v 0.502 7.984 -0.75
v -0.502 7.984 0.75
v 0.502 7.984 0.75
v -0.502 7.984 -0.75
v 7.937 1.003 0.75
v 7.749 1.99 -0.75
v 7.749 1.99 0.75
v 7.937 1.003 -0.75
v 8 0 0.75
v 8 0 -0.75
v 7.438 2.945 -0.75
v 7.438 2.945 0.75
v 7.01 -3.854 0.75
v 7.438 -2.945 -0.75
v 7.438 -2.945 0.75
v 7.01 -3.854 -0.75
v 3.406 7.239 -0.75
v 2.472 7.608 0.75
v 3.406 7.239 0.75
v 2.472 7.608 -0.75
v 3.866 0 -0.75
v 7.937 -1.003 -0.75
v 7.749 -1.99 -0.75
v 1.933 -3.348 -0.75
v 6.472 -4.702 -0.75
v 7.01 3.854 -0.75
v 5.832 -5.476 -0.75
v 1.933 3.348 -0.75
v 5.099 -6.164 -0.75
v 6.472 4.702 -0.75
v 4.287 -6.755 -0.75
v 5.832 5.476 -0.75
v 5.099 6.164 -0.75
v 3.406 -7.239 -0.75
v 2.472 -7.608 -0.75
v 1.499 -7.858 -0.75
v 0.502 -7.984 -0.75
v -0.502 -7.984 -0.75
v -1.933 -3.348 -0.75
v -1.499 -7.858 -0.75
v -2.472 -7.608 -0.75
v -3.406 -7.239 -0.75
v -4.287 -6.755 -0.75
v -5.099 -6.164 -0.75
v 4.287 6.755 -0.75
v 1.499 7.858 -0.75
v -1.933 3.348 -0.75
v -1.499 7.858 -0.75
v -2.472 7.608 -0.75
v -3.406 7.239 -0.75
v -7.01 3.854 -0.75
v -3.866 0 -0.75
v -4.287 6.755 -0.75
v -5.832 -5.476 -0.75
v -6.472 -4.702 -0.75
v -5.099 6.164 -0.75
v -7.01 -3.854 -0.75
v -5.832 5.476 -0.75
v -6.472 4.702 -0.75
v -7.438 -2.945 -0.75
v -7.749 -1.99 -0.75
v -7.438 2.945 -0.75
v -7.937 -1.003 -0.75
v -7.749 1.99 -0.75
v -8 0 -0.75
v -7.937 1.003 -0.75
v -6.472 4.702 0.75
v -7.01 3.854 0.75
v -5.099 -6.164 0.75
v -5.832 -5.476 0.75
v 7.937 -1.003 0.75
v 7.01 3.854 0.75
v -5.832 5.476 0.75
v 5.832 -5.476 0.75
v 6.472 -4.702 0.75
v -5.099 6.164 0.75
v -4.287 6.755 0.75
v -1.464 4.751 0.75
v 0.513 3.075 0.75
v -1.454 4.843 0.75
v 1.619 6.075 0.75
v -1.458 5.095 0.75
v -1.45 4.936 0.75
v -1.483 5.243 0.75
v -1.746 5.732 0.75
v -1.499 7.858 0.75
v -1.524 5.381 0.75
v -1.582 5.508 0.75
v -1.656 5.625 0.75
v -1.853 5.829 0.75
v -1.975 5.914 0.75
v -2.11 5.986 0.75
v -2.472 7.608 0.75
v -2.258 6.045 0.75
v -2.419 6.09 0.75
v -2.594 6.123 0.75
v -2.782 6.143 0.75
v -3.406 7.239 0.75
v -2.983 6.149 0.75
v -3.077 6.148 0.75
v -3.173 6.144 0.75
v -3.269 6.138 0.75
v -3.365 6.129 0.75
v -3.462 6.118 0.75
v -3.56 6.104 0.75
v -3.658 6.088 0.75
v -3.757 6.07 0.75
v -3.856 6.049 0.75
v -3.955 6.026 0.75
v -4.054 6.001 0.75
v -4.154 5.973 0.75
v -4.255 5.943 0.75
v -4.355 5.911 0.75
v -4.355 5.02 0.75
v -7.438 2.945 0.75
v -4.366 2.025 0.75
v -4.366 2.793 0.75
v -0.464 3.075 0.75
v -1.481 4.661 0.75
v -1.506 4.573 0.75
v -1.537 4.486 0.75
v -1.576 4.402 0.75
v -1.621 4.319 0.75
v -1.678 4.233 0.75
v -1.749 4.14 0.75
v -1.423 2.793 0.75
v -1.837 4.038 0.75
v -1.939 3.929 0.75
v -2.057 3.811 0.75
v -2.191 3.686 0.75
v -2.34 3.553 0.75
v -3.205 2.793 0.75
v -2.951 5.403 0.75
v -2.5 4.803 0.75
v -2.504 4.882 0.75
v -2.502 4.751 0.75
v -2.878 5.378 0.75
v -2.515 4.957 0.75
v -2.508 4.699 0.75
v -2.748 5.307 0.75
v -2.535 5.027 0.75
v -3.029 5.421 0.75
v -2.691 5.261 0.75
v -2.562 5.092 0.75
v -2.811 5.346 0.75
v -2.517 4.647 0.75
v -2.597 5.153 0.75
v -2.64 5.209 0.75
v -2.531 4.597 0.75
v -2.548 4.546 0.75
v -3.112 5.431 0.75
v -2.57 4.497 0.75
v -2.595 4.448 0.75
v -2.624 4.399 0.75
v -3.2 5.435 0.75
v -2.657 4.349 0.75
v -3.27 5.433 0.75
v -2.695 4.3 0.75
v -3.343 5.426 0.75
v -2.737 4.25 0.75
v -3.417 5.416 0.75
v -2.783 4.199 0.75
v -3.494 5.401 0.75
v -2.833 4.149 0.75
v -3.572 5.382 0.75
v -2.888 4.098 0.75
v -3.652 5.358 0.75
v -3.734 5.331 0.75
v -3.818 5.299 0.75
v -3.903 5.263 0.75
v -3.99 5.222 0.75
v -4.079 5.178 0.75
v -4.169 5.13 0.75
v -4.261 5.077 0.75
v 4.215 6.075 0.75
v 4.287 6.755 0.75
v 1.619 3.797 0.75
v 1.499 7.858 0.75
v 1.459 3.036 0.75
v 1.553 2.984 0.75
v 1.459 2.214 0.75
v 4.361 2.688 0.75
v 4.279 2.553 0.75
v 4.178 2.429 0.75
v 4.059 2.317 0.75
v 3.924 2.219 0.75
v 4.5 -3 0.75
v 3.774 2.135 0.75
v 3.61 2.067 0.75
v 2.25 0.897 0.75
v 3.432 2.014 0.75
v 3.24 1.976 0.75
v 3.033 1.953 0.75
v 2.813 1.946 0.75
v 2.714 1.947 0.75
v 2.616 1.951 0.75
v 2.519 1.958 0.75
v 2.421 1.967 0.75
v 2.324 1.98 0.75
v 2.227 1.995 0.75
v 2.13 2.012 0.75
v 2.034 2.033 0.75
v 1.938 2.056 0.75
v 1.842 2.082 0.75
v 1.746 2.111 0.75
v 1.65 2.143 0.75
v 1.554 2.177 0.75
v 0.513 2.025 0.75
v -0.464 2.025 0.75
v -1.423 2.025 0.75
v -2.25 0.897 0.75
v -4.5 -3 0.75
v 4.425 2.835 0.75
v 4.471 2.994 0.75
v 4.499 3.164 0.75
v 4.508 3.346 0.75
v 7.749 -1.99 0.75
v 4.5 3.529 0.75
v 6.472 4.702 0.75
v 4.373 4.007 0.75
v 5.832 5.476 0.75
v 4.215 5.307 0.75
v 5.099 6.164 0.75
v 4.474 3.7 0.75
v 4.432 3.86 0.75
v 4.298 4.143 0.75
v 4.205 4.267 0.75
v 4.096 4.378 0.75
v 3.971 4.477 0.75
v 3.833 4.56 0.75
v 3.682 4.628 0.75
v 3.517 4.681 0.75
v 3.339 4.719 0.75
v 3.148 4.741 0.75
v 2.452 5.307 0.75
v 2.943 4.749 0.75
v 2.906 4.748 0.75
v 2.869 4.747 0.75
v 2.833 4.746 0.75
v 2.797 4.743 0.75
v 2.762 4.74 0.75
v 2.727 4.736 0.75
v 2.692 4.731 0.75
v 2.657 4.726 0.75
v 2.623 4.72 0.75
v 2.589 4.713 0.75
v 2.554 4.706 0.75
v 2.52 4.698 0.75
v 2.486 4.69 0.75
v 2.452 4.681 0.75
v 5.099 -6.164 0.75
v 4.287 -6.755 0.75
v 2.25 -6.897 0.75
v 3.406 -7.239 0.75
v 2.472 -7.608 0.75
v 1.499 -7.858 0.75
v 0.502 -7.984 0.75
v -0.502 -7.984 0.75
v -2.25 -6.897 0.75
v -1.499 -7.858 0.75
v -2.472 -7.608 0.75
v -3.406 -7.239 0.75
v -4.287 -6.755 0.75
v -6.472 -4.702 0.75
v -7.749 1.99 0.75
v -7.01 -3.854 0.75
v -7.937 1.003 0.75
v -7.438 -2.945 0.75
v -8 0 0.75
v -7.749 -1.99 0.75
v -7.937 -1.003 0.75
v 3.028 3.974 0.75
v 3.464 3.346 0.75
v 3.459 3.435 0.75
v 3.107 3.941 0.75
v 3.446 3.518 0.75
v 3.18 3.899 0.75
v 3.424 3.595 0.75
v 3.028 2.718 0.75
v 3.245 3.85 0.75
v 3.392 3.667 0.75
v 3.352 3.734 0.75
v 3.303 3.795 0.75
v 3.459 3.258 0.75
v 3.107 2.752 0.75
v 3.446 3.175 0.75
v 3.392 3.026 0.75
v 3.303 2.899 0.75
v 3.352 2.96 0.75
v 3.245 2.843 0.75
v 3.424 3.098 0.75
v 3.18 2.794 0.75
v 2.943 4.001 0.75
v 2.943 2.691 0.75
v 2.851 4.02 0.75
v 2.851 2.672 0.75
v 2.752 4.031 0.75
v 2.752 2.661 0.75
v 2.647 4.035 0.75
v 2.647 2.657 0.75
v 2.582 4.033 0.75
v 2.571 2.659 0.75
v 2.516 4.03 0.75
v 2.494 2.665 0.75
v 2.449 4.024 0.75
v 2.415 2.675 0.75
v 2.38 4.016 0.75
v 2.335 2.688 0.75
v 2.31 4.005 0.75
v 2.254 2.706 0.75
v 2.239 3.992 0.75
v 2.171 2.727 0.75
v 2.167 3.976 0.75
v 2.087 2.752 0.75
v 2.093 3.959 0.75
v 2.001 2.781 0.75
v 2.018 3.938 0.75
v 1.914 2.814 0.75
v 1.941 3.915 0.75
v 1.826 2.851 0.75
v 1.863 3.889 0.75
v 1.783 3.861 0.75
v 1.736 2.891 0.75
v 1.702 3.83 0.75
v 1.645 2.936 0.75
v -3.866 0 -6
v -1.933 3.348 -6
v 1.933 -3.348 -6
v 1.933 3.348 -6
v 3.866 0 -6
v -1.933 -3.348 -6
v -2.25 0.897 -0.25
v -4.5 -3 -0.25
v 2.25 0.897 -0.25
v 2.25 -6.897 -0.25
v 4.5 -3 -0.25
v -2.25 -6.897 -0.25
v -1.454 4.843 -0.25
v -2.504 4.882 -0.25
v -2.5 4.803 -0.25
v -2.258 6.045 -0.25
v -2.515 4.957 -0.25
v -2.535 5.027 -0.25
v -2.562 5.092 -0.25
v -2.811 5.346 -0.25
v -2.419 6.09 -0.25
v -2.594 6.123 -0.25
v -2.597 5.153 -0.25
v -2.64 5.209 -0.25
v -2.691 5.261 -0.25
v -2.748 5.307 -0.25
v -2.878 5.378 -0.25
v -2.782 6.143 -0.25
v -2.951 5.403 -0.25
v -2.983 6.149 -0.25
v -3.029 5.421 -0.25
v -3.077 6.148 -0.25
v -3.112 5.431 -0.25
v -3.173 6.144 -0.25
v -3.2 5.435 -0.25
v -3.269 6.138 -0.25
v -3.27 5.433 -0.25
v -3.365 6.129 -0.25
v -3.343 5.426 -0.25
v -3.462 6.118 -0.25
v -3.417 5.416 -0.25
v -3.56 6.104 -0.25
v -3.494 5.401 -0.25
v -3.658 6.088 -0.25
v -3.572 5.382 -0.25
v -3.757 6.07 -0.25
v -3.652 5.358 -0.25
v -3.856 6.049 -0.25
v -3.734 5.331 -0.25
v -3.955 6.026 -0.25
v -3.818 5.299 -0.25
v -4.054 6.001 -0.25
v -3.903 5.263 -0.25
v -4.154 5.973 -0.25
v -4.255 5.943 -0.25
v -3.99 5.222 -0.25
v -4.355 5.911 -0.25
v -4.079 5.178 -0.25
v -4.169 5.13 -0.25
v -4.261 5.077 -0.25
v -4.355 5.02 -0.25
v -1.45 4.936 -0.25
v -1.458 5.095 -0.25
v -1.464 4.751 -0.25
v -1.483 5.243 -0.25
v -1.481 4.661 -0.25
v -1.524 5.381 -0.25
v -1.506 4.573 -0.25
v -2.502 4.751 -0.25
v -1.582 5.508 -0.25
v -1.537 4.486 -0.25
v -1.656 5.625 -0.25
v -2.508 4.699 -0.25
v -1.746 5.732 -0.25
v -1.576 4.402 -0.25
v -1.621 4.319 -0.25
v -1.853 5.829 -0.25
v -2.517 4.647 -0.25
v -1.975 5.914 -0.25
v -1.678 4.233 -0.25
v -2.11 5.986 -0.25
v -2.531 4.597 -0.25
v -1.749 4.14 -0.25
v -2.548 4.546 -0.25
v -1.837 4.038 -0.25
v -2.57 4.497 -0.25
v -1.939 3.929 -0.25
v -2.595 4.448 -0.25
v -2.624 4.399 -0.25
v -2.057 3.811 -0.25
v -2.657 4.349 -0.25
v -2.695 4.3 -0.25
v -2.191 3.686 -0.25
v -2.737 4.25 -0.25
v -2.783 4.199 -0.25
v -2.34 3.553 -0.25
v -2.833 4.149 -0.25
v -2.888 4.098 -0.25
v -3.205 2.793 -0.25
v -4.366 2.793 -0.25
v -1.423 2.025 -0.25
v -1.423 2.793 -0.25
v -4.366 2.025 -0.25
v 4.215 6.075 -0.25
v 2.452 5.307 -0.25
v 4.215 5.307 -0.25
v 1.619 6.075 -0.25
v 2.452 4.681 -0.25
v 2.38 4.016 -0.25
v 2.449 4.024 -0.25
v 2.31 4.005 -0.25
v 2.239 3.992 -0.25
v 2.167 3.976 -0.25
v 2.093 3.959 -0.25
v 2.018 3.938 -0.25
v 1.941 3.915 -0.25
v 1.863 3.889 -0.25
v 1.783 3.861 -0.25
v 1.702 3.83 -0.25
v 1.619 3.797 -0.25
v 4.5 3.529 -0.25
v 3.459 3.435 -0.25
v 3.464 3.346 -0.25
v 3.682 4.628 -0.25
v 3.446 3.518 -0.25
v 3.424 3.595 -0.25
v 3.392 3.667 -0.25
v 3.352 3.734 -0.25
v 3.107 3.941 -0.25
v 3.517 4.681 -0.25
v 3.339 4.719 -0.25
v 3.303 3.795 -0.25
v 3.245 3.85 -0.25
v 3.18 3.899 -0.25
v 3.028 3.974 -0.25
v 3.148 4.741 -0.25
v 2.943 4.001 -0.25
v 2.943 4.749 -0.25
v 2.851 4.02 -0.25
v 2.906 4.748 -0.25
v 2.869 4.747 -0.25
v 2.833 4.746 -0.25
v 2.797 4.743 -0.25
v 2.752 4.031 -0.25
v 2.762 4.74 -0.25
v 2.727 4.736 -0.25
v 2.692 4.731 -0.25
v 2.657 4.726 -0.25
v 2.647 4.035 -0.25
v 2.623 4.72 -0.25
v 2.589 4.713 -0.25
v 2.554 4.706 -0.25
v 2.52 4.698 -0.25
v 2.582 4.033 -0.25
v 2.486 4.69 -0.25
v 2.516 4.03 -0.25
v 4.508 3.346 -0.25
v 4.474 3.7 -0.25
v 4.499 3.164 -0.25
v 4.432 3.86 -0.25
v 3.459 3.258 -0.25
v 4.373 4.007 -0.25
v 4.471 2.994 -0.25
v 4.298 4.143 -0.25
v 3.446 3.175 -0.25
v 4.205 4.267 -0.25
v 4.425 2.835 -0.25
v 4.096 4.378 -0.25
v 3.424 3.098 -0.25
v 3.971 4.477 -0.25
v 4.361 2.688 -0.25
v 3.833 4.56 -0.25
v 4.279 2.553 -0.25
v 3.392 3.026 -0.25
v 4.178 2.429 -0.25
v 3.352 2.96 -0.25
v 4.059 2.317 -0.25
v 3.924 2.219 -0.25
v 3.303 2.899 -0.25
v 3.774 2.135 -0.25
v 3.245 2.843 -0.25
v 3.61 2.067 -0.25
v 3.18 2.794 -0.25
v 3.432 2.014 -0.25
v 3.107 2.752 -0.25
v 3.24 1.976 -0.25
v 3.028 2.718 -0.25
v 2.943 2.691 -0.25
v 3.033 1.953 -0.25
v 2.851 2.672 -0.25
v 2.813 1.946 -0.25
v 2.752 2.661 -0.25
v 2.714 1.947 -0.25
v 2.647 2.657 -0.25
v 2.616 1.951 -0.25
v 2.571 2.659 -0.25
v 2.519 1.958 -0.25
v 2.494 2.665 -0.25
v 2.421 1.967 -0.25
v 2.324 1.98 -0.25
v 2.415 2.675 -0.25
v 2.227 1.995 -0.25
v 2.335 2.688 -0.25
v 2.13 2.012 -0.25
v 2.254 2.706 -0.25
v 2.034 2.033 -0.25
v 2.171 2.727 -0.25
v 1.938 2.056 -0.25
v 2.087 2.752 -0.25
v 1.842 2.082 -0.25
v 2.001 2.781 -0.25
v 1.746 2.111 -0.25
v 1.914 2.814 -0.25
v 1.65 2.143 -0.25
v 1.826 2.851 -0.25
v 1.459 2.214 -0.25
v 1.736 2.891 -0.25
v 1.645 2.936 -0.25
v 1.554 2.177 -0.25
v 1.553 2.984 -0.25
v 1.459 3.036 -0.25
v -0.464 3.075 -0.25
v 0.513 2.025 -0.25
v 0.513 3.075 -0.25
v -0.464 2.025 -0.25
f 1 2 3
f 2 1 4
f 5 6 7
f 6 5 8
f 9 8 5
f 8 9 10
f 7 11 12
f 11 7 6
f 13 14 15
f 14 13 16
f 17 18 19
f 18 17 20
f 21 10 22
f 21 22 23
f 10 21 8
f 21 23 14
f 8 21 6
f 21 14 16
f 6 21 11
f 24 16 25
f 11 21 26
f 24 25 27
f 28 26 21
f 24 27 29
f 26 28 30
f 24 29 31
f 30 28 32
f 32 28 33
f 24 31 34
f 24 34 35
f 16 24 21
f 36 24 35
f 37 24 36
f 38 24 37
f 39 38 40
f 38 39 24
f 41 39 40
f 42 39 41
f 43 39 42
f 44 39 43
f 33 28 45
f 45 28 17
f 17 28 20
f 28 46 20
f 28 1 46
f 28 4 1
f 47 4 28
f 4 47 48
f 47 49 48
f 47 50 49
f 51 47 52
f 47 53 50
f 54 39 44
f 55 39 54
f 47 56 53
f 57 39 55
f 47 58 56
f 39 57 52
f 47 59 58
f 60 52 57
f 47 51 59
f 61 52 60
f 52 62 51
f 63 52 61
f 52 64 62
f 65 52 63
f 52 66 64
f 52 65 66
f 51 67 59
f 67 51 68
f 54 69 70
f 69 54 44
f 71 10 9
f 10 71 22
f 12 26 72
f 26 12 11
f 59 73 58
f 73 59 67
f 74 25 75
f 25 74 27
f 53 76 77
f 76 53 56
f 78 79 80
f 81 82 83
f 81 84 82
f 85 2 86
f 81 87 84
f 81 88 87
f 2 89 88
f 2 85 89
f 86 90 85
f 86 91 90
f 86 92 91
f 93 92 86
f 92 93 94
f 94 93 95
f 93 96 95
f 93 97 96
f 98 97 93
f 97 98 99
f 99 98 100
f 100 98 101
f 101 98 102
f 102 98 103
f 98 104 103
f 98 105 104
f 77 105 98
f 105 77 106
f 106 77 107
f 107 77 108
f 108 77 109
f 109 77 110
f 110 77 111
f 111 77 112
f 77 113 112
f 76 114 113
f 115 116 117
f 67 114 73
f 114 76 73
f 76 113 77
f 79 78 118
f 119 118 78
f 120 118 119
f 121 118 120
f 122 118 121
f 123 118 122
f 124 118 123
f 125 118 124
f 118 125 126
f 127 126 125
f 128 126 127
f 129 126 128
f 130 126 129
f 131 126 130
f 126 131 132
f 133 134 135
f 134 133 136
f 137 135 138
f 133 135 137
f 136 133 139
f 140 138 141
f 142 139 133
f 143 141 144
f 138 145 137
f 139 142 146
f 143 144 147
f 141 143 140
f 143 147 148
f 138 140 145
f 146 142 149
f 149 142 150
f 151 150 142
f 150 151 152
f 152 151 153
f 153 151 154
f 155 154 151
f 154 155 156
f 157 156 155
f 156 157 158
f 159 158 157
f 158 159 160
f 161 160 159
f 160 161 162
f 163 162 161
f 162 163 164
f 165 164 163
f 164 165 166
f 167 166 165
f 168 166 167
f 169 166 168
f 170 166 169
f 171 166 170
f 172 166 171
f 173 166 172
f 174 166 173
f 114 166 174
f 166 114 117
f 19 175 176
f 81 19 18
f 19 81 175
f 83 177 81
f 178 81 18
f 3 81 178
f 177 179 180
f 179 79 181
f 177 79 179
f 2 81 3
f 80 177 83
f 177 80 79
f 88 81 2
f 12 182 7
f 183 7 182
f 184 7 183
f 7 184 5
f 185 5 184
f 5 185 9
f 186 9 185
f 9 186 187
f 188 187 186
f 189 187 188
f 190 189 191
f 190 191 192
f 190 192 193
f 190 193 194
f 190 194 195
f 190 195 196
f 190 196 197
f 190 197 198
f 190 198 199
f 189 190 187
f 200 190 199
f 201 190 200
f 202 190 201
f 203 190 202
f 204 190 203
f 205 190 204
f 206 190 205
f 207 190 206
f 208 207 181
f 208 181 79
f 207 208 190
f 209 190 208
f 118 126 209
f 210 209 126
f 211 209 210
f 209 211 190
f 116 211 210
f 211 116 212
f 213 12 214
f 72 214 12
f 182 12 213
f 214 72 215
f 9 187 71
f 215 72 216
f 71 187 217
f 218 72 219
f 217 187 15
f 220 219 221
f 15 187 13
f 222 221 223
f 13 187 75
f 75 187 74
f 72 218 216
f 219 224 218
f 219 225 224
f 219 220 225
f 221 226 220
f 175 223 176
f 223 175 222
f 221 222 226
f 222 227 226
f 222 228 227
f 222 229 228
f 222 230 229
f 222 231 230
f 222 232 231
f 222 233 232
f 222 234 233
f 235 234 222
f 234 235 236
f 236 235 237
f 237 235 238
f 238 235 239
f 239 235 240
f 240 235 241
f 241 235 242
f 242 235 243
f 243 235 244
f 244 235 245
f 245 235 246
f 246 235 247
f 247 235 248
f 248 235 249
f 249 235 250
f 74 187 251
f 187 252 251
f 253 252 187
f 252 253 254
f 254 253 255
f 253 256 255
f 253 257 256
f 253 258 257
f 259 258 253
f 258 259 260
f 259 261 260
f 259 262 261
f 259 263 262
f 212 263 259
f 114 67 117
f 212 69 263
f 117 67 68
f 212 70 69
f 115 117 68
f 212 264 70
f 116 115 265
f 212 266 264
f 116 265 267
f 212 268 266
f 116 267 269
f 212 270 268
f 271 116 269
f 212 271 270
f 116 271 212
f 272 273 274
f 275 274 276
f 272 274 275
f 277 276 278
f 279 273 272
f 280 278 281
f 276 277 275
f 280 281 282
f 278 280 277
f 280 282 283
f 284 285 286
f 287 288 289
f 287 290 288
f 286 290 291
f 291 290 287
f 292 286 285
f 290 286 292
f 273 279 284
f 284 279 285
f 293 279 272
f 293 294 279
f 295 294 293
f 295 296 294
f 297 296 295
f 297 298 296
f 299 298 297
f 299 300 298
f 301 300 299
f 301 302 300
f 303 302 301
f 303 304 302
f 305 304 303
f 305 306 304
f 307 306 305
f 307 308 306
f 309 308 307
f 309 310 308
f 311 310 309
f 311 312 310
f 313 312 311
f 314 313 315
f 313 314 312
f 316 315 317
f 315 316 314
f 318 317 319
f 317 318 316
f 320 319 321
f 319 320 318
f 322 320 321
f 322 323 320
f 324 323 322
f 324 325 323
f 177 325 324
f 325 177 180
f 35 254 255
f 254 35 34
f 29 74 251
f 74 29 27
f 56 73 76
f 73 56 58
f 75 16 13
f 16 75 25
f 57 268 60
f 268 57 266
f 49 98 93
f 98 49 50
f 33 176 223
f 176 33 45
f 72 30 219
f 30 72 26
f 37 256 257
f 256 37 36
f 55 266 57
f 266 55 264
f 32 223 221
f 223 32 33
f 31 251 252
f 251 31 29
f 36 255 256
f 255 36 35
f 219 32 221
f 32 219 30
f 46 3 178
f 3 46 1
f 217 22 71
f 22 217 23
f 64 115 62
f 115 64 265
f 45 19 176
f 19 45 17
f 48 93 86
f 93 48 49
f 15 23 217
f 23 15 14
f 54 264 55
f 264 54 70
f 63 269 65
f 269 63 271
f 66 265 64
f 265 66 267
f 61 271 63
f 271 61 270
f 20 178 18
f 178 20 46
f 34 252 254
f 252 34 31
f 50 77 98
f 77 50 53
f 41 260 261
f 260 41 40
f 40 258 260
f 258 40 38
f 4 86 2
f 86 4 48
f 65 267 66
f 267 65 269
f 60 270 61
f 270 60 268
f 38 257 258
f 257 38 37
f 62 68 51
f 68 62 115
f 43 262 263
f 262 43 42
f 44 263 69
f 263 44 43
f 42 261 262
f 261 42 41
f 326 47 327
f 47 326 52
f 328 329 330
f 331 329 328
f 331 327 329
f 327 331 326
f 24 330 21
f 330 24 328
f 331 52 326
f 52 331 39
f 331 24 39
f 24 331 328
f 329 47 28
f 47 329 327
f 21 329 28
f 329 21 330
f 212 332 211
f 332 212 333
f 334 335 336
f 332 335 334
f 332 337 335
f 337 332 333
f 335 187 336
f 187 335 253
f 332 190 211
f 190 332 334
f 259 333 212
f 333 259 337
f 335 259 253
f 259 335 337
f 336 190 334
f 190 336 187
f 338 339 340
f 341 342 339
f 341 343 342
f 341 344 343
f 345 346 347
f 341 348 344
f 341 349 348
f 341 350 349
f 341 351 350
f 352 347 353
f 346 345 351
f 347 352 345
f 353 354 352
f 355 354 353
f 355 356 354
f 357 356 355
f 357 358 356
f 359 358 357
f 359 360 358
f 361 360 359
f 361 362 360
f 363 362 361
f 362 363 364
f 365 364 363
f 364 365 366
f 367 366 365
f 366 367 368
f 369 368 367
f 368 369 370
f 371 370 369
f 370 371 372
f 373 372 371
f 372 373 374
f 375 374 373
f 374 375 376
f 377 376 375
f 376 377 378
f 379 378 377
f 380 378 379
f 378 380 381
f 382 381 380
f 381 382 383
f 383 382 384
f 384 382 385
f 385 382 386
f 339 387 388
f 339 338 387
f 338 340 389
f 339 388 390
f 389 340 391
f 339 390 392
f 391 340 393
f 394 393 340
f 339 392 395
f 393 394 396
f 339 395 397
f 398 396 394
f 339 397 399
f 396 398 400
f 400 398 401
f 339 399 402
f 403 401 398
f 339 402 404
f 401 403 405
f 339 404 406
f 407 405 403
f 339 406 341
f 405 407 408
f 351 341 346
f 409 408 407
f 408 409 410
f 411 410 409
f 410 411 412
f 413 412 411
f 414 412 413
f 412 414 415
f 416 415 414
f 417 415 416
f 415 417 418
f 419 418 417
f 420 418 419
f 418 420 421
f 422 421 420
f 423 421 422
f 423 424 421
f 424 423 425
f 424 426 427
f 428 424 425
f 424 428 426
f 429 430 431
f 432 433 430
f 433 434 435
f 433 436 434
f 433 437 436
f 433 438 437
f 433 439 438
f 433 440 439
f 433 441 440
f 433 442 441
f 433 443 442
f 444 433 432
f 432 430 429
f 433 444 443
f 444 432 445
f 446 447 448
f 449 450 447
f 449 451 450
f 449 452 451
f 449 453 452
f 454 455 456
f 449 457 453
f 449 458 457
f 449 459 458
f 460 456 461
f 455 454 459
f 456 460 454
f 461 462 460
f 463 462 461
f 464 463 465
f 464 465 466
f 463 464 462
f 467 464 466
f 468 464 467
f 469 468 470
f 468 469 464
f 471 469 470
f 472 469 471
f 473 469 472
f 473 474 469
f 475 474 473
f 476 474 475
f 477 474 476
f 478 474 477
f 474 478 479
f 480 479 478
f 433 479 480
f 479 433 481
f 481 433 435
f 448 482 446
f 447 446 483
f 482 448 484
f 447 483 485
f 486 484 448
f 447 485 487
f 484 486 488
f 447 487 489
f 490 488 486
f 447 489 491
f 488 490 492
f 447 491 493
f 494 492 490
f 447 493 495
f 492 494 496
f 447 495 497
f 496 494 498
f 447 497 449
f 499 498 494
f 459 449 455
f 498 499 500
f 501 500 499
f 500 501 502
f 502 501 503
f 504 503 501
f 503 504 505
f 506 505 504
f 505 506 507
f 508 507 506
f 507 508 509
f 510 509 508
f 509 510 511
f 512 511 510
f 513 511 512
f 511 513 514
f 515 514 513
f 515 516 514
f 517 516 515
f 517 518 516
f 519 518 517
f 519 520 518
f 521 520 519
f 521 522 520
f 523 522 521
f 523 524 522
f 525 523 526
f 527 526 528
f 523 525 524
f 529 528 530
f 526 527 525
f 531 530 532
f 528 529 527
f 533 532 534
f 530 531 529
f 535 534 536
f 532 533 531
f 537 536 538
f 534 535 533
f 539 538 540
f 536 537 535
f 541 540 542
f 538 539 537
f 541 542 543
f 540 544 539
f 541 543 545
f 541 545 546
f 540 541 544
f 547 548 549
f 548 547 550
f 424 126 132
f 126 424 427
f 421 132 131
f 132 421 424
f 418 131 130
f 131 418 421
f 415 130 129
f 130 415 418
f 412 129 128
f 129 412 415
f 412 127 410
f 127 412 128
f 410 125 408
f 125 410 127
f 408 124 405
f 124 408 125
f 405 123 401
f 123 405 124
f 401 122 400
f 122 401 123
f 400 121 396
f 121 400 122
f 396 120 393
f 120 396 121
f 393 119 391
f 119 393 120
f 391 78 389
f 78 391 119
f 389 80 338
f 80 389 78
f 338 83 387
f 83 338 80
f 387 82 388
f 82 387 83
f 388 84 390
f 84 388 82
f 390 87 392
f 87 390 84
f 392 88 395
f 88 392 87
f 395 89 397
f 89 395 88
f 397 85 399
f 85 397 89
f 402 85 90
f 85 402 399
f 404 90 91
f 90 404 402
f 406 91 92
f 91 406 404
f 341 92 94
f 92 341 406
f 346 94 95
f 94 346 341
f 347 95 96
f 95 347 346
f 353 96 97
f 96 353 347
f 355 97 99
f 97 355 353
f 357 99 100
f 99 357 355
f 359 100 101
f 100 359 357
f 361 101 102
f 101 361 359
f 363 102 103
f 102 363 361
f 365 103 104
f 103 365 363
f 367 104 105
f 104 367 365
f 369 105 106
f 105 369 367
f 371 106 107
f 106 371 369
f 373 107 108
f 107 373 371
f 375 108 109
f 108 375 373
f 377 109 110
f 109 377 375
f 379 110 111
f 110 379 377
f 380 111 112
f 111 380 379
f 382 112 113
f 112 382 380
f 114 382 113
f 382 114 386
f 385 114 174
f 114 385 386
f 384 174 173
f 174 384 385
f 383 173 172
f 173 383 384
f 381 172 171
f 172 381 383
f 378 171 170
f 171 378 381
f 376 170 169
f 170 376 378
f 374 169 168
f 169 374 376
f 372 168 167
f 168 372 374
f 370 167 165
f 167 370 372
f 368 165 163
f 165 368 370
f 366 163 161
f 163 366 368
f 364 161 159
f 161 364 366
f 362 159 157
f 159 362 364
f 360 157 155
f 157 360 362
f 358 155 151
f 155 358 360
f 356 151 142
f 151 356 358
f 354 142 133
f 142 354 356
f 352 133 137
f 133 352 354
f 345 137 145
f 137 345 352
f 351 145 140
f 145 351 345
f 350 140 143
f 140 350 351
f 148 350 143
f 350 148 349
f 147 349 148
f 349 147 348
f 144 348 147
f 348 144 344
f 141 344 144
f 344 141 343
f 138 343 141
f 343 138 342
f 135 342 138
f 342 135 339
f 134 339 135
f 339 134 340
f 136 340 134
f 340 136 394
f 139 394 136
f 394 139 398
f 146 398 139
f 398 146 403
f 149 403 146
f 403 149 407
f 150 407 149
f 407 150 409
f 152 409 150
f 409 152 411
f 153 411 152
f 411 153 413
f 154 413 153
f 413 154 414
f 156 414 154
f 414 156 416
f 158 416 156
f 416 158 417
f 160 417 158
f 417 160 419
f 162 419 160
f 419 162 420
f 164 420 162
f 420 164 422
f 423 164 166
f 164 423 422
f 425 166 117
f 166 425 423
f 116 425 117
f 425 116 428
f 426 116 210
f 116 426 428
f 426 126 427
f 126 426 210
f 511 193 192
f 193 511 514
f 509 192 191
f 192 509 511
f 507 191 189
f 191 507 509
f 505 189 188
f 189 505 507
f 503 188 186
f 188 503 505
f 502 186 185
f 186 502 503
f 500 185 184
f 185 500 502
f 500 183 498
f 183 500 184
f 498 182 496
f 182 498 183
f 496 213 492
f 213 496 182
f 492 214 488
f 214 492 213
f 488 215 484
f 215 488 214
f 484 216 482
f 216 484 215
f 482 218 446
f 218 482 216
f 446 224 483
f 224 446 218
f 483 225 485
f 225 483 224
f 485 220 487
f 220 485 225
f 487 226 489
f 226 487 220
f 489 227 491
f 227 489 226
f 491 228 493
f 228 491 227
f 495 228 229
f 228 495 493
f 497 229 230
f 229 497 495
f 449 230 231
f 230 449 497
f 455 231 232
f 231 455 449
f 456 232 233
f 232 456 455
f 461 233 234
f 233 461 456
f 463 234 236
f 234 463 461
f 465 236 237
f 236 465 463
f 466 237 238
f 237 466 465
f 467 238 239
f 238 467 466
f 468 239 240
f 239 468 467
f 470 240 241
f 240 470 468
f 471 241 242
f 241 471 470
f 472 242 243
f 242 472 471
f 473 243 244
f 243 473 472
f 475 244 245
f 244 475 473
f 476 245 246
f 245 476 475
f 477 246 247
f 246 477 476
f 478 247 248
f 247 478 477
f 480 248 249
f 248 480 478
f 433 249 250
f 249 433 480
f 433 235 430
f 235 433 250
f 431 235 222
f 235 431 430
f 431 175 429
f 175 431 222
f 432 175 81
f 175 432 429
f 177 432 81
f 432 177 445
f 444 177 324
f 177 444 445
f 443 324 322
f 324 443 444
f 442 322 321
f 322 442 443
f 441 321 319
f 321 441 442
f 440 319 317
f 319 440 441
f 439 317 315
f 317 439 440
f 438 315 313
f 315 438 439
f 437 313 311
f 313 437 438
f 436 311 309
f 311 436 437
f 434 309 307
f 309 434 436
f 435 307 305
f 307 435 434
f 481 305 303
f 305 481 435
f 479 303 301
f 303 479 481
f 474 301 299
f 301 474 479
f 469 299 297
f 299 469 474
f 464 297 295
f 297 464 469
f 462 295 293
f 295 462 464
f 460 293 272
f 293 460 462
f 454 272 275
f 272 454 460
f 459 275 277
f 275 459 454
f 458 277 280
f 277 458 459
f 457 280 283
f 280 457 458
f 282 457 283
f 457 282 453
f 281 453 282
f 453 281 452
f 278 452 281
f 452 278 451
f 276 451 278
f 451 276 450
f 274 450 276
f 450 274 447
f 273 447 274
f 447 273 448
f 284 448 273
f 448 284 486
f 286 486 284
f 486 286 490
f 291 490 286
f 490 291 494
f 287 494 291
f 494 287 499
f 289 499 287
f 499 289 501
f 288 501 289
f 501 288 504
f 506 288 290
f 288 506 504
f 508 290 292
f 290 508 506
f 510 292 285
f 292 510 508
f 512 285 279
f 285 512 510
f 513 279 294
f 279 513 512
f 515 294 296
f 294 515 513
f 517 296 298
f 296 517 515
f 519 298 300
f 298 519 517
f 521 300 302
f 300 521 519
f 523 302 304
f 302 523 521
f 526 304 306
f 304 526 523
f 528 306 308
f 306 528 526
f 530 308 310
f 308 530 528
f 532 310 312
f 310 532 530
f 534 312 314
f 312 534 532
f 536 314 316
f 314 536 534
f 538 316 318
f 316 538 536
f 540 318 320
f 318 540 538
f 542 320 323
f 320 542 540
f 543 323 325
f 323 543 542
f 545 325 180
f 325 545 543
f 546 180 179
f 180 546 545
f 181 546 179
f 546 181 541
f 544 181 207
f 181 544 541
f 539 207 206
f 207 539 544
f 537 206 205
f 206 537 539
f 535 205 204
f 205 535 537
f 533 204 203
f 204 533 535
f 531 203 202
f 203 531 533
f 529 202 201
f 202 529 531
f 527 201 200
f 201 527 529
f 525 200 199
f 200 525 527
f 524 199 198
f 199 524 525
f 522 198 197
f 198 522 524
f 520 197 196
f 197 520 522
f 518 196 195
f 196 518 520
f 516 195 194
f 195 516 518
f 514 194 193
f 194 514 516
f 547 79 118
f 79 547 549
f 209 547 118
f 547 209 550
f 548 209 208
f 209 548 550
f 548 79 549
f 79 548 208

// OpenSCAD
$fn = 50;


difference() {
	union() {
		translate(v = [0, 0, -0.7500000000]) {
			cylinder(h = 1.5000000000, r = 8.0000000000);
		}
		translate(v = [0, 0, -6]) {
			linear_extrude(height = 6) {
				polygon(points = [[3.8658550000, 0.0000000000], [1.9329275000, 3.3479286373], [-1.9329275000, 3.3479286373], [-3.8658550000, 0.0000000000], [-1.9329275000, -3.3479286373], [1.9329275000, -3.3479286373]]);
			}
		}
	}
	union() {
		translate(v = [0, -3, -0.2500000000]) {
			#linear_extrude(height = 1) {
				polygon(points = [[4.5000000000, 0.0000000000], [2.2500000000, 3.8971143170], [-2.2500000000, 3.8971143170], [-4.5000000000, 0.0000000000], [-2.2500000000, -3.8971143170], [2.2500000000, -3.8971143170]]);
			}
		}
		#translate(v = [0, 4, -0.2500000000]) {
			linear_extrude(height = 1) {
				text(font = "SegoiUI:Bold", halign = "center", size = 4, text = "2.5", valign = "center");
			}
		}
	}
}
